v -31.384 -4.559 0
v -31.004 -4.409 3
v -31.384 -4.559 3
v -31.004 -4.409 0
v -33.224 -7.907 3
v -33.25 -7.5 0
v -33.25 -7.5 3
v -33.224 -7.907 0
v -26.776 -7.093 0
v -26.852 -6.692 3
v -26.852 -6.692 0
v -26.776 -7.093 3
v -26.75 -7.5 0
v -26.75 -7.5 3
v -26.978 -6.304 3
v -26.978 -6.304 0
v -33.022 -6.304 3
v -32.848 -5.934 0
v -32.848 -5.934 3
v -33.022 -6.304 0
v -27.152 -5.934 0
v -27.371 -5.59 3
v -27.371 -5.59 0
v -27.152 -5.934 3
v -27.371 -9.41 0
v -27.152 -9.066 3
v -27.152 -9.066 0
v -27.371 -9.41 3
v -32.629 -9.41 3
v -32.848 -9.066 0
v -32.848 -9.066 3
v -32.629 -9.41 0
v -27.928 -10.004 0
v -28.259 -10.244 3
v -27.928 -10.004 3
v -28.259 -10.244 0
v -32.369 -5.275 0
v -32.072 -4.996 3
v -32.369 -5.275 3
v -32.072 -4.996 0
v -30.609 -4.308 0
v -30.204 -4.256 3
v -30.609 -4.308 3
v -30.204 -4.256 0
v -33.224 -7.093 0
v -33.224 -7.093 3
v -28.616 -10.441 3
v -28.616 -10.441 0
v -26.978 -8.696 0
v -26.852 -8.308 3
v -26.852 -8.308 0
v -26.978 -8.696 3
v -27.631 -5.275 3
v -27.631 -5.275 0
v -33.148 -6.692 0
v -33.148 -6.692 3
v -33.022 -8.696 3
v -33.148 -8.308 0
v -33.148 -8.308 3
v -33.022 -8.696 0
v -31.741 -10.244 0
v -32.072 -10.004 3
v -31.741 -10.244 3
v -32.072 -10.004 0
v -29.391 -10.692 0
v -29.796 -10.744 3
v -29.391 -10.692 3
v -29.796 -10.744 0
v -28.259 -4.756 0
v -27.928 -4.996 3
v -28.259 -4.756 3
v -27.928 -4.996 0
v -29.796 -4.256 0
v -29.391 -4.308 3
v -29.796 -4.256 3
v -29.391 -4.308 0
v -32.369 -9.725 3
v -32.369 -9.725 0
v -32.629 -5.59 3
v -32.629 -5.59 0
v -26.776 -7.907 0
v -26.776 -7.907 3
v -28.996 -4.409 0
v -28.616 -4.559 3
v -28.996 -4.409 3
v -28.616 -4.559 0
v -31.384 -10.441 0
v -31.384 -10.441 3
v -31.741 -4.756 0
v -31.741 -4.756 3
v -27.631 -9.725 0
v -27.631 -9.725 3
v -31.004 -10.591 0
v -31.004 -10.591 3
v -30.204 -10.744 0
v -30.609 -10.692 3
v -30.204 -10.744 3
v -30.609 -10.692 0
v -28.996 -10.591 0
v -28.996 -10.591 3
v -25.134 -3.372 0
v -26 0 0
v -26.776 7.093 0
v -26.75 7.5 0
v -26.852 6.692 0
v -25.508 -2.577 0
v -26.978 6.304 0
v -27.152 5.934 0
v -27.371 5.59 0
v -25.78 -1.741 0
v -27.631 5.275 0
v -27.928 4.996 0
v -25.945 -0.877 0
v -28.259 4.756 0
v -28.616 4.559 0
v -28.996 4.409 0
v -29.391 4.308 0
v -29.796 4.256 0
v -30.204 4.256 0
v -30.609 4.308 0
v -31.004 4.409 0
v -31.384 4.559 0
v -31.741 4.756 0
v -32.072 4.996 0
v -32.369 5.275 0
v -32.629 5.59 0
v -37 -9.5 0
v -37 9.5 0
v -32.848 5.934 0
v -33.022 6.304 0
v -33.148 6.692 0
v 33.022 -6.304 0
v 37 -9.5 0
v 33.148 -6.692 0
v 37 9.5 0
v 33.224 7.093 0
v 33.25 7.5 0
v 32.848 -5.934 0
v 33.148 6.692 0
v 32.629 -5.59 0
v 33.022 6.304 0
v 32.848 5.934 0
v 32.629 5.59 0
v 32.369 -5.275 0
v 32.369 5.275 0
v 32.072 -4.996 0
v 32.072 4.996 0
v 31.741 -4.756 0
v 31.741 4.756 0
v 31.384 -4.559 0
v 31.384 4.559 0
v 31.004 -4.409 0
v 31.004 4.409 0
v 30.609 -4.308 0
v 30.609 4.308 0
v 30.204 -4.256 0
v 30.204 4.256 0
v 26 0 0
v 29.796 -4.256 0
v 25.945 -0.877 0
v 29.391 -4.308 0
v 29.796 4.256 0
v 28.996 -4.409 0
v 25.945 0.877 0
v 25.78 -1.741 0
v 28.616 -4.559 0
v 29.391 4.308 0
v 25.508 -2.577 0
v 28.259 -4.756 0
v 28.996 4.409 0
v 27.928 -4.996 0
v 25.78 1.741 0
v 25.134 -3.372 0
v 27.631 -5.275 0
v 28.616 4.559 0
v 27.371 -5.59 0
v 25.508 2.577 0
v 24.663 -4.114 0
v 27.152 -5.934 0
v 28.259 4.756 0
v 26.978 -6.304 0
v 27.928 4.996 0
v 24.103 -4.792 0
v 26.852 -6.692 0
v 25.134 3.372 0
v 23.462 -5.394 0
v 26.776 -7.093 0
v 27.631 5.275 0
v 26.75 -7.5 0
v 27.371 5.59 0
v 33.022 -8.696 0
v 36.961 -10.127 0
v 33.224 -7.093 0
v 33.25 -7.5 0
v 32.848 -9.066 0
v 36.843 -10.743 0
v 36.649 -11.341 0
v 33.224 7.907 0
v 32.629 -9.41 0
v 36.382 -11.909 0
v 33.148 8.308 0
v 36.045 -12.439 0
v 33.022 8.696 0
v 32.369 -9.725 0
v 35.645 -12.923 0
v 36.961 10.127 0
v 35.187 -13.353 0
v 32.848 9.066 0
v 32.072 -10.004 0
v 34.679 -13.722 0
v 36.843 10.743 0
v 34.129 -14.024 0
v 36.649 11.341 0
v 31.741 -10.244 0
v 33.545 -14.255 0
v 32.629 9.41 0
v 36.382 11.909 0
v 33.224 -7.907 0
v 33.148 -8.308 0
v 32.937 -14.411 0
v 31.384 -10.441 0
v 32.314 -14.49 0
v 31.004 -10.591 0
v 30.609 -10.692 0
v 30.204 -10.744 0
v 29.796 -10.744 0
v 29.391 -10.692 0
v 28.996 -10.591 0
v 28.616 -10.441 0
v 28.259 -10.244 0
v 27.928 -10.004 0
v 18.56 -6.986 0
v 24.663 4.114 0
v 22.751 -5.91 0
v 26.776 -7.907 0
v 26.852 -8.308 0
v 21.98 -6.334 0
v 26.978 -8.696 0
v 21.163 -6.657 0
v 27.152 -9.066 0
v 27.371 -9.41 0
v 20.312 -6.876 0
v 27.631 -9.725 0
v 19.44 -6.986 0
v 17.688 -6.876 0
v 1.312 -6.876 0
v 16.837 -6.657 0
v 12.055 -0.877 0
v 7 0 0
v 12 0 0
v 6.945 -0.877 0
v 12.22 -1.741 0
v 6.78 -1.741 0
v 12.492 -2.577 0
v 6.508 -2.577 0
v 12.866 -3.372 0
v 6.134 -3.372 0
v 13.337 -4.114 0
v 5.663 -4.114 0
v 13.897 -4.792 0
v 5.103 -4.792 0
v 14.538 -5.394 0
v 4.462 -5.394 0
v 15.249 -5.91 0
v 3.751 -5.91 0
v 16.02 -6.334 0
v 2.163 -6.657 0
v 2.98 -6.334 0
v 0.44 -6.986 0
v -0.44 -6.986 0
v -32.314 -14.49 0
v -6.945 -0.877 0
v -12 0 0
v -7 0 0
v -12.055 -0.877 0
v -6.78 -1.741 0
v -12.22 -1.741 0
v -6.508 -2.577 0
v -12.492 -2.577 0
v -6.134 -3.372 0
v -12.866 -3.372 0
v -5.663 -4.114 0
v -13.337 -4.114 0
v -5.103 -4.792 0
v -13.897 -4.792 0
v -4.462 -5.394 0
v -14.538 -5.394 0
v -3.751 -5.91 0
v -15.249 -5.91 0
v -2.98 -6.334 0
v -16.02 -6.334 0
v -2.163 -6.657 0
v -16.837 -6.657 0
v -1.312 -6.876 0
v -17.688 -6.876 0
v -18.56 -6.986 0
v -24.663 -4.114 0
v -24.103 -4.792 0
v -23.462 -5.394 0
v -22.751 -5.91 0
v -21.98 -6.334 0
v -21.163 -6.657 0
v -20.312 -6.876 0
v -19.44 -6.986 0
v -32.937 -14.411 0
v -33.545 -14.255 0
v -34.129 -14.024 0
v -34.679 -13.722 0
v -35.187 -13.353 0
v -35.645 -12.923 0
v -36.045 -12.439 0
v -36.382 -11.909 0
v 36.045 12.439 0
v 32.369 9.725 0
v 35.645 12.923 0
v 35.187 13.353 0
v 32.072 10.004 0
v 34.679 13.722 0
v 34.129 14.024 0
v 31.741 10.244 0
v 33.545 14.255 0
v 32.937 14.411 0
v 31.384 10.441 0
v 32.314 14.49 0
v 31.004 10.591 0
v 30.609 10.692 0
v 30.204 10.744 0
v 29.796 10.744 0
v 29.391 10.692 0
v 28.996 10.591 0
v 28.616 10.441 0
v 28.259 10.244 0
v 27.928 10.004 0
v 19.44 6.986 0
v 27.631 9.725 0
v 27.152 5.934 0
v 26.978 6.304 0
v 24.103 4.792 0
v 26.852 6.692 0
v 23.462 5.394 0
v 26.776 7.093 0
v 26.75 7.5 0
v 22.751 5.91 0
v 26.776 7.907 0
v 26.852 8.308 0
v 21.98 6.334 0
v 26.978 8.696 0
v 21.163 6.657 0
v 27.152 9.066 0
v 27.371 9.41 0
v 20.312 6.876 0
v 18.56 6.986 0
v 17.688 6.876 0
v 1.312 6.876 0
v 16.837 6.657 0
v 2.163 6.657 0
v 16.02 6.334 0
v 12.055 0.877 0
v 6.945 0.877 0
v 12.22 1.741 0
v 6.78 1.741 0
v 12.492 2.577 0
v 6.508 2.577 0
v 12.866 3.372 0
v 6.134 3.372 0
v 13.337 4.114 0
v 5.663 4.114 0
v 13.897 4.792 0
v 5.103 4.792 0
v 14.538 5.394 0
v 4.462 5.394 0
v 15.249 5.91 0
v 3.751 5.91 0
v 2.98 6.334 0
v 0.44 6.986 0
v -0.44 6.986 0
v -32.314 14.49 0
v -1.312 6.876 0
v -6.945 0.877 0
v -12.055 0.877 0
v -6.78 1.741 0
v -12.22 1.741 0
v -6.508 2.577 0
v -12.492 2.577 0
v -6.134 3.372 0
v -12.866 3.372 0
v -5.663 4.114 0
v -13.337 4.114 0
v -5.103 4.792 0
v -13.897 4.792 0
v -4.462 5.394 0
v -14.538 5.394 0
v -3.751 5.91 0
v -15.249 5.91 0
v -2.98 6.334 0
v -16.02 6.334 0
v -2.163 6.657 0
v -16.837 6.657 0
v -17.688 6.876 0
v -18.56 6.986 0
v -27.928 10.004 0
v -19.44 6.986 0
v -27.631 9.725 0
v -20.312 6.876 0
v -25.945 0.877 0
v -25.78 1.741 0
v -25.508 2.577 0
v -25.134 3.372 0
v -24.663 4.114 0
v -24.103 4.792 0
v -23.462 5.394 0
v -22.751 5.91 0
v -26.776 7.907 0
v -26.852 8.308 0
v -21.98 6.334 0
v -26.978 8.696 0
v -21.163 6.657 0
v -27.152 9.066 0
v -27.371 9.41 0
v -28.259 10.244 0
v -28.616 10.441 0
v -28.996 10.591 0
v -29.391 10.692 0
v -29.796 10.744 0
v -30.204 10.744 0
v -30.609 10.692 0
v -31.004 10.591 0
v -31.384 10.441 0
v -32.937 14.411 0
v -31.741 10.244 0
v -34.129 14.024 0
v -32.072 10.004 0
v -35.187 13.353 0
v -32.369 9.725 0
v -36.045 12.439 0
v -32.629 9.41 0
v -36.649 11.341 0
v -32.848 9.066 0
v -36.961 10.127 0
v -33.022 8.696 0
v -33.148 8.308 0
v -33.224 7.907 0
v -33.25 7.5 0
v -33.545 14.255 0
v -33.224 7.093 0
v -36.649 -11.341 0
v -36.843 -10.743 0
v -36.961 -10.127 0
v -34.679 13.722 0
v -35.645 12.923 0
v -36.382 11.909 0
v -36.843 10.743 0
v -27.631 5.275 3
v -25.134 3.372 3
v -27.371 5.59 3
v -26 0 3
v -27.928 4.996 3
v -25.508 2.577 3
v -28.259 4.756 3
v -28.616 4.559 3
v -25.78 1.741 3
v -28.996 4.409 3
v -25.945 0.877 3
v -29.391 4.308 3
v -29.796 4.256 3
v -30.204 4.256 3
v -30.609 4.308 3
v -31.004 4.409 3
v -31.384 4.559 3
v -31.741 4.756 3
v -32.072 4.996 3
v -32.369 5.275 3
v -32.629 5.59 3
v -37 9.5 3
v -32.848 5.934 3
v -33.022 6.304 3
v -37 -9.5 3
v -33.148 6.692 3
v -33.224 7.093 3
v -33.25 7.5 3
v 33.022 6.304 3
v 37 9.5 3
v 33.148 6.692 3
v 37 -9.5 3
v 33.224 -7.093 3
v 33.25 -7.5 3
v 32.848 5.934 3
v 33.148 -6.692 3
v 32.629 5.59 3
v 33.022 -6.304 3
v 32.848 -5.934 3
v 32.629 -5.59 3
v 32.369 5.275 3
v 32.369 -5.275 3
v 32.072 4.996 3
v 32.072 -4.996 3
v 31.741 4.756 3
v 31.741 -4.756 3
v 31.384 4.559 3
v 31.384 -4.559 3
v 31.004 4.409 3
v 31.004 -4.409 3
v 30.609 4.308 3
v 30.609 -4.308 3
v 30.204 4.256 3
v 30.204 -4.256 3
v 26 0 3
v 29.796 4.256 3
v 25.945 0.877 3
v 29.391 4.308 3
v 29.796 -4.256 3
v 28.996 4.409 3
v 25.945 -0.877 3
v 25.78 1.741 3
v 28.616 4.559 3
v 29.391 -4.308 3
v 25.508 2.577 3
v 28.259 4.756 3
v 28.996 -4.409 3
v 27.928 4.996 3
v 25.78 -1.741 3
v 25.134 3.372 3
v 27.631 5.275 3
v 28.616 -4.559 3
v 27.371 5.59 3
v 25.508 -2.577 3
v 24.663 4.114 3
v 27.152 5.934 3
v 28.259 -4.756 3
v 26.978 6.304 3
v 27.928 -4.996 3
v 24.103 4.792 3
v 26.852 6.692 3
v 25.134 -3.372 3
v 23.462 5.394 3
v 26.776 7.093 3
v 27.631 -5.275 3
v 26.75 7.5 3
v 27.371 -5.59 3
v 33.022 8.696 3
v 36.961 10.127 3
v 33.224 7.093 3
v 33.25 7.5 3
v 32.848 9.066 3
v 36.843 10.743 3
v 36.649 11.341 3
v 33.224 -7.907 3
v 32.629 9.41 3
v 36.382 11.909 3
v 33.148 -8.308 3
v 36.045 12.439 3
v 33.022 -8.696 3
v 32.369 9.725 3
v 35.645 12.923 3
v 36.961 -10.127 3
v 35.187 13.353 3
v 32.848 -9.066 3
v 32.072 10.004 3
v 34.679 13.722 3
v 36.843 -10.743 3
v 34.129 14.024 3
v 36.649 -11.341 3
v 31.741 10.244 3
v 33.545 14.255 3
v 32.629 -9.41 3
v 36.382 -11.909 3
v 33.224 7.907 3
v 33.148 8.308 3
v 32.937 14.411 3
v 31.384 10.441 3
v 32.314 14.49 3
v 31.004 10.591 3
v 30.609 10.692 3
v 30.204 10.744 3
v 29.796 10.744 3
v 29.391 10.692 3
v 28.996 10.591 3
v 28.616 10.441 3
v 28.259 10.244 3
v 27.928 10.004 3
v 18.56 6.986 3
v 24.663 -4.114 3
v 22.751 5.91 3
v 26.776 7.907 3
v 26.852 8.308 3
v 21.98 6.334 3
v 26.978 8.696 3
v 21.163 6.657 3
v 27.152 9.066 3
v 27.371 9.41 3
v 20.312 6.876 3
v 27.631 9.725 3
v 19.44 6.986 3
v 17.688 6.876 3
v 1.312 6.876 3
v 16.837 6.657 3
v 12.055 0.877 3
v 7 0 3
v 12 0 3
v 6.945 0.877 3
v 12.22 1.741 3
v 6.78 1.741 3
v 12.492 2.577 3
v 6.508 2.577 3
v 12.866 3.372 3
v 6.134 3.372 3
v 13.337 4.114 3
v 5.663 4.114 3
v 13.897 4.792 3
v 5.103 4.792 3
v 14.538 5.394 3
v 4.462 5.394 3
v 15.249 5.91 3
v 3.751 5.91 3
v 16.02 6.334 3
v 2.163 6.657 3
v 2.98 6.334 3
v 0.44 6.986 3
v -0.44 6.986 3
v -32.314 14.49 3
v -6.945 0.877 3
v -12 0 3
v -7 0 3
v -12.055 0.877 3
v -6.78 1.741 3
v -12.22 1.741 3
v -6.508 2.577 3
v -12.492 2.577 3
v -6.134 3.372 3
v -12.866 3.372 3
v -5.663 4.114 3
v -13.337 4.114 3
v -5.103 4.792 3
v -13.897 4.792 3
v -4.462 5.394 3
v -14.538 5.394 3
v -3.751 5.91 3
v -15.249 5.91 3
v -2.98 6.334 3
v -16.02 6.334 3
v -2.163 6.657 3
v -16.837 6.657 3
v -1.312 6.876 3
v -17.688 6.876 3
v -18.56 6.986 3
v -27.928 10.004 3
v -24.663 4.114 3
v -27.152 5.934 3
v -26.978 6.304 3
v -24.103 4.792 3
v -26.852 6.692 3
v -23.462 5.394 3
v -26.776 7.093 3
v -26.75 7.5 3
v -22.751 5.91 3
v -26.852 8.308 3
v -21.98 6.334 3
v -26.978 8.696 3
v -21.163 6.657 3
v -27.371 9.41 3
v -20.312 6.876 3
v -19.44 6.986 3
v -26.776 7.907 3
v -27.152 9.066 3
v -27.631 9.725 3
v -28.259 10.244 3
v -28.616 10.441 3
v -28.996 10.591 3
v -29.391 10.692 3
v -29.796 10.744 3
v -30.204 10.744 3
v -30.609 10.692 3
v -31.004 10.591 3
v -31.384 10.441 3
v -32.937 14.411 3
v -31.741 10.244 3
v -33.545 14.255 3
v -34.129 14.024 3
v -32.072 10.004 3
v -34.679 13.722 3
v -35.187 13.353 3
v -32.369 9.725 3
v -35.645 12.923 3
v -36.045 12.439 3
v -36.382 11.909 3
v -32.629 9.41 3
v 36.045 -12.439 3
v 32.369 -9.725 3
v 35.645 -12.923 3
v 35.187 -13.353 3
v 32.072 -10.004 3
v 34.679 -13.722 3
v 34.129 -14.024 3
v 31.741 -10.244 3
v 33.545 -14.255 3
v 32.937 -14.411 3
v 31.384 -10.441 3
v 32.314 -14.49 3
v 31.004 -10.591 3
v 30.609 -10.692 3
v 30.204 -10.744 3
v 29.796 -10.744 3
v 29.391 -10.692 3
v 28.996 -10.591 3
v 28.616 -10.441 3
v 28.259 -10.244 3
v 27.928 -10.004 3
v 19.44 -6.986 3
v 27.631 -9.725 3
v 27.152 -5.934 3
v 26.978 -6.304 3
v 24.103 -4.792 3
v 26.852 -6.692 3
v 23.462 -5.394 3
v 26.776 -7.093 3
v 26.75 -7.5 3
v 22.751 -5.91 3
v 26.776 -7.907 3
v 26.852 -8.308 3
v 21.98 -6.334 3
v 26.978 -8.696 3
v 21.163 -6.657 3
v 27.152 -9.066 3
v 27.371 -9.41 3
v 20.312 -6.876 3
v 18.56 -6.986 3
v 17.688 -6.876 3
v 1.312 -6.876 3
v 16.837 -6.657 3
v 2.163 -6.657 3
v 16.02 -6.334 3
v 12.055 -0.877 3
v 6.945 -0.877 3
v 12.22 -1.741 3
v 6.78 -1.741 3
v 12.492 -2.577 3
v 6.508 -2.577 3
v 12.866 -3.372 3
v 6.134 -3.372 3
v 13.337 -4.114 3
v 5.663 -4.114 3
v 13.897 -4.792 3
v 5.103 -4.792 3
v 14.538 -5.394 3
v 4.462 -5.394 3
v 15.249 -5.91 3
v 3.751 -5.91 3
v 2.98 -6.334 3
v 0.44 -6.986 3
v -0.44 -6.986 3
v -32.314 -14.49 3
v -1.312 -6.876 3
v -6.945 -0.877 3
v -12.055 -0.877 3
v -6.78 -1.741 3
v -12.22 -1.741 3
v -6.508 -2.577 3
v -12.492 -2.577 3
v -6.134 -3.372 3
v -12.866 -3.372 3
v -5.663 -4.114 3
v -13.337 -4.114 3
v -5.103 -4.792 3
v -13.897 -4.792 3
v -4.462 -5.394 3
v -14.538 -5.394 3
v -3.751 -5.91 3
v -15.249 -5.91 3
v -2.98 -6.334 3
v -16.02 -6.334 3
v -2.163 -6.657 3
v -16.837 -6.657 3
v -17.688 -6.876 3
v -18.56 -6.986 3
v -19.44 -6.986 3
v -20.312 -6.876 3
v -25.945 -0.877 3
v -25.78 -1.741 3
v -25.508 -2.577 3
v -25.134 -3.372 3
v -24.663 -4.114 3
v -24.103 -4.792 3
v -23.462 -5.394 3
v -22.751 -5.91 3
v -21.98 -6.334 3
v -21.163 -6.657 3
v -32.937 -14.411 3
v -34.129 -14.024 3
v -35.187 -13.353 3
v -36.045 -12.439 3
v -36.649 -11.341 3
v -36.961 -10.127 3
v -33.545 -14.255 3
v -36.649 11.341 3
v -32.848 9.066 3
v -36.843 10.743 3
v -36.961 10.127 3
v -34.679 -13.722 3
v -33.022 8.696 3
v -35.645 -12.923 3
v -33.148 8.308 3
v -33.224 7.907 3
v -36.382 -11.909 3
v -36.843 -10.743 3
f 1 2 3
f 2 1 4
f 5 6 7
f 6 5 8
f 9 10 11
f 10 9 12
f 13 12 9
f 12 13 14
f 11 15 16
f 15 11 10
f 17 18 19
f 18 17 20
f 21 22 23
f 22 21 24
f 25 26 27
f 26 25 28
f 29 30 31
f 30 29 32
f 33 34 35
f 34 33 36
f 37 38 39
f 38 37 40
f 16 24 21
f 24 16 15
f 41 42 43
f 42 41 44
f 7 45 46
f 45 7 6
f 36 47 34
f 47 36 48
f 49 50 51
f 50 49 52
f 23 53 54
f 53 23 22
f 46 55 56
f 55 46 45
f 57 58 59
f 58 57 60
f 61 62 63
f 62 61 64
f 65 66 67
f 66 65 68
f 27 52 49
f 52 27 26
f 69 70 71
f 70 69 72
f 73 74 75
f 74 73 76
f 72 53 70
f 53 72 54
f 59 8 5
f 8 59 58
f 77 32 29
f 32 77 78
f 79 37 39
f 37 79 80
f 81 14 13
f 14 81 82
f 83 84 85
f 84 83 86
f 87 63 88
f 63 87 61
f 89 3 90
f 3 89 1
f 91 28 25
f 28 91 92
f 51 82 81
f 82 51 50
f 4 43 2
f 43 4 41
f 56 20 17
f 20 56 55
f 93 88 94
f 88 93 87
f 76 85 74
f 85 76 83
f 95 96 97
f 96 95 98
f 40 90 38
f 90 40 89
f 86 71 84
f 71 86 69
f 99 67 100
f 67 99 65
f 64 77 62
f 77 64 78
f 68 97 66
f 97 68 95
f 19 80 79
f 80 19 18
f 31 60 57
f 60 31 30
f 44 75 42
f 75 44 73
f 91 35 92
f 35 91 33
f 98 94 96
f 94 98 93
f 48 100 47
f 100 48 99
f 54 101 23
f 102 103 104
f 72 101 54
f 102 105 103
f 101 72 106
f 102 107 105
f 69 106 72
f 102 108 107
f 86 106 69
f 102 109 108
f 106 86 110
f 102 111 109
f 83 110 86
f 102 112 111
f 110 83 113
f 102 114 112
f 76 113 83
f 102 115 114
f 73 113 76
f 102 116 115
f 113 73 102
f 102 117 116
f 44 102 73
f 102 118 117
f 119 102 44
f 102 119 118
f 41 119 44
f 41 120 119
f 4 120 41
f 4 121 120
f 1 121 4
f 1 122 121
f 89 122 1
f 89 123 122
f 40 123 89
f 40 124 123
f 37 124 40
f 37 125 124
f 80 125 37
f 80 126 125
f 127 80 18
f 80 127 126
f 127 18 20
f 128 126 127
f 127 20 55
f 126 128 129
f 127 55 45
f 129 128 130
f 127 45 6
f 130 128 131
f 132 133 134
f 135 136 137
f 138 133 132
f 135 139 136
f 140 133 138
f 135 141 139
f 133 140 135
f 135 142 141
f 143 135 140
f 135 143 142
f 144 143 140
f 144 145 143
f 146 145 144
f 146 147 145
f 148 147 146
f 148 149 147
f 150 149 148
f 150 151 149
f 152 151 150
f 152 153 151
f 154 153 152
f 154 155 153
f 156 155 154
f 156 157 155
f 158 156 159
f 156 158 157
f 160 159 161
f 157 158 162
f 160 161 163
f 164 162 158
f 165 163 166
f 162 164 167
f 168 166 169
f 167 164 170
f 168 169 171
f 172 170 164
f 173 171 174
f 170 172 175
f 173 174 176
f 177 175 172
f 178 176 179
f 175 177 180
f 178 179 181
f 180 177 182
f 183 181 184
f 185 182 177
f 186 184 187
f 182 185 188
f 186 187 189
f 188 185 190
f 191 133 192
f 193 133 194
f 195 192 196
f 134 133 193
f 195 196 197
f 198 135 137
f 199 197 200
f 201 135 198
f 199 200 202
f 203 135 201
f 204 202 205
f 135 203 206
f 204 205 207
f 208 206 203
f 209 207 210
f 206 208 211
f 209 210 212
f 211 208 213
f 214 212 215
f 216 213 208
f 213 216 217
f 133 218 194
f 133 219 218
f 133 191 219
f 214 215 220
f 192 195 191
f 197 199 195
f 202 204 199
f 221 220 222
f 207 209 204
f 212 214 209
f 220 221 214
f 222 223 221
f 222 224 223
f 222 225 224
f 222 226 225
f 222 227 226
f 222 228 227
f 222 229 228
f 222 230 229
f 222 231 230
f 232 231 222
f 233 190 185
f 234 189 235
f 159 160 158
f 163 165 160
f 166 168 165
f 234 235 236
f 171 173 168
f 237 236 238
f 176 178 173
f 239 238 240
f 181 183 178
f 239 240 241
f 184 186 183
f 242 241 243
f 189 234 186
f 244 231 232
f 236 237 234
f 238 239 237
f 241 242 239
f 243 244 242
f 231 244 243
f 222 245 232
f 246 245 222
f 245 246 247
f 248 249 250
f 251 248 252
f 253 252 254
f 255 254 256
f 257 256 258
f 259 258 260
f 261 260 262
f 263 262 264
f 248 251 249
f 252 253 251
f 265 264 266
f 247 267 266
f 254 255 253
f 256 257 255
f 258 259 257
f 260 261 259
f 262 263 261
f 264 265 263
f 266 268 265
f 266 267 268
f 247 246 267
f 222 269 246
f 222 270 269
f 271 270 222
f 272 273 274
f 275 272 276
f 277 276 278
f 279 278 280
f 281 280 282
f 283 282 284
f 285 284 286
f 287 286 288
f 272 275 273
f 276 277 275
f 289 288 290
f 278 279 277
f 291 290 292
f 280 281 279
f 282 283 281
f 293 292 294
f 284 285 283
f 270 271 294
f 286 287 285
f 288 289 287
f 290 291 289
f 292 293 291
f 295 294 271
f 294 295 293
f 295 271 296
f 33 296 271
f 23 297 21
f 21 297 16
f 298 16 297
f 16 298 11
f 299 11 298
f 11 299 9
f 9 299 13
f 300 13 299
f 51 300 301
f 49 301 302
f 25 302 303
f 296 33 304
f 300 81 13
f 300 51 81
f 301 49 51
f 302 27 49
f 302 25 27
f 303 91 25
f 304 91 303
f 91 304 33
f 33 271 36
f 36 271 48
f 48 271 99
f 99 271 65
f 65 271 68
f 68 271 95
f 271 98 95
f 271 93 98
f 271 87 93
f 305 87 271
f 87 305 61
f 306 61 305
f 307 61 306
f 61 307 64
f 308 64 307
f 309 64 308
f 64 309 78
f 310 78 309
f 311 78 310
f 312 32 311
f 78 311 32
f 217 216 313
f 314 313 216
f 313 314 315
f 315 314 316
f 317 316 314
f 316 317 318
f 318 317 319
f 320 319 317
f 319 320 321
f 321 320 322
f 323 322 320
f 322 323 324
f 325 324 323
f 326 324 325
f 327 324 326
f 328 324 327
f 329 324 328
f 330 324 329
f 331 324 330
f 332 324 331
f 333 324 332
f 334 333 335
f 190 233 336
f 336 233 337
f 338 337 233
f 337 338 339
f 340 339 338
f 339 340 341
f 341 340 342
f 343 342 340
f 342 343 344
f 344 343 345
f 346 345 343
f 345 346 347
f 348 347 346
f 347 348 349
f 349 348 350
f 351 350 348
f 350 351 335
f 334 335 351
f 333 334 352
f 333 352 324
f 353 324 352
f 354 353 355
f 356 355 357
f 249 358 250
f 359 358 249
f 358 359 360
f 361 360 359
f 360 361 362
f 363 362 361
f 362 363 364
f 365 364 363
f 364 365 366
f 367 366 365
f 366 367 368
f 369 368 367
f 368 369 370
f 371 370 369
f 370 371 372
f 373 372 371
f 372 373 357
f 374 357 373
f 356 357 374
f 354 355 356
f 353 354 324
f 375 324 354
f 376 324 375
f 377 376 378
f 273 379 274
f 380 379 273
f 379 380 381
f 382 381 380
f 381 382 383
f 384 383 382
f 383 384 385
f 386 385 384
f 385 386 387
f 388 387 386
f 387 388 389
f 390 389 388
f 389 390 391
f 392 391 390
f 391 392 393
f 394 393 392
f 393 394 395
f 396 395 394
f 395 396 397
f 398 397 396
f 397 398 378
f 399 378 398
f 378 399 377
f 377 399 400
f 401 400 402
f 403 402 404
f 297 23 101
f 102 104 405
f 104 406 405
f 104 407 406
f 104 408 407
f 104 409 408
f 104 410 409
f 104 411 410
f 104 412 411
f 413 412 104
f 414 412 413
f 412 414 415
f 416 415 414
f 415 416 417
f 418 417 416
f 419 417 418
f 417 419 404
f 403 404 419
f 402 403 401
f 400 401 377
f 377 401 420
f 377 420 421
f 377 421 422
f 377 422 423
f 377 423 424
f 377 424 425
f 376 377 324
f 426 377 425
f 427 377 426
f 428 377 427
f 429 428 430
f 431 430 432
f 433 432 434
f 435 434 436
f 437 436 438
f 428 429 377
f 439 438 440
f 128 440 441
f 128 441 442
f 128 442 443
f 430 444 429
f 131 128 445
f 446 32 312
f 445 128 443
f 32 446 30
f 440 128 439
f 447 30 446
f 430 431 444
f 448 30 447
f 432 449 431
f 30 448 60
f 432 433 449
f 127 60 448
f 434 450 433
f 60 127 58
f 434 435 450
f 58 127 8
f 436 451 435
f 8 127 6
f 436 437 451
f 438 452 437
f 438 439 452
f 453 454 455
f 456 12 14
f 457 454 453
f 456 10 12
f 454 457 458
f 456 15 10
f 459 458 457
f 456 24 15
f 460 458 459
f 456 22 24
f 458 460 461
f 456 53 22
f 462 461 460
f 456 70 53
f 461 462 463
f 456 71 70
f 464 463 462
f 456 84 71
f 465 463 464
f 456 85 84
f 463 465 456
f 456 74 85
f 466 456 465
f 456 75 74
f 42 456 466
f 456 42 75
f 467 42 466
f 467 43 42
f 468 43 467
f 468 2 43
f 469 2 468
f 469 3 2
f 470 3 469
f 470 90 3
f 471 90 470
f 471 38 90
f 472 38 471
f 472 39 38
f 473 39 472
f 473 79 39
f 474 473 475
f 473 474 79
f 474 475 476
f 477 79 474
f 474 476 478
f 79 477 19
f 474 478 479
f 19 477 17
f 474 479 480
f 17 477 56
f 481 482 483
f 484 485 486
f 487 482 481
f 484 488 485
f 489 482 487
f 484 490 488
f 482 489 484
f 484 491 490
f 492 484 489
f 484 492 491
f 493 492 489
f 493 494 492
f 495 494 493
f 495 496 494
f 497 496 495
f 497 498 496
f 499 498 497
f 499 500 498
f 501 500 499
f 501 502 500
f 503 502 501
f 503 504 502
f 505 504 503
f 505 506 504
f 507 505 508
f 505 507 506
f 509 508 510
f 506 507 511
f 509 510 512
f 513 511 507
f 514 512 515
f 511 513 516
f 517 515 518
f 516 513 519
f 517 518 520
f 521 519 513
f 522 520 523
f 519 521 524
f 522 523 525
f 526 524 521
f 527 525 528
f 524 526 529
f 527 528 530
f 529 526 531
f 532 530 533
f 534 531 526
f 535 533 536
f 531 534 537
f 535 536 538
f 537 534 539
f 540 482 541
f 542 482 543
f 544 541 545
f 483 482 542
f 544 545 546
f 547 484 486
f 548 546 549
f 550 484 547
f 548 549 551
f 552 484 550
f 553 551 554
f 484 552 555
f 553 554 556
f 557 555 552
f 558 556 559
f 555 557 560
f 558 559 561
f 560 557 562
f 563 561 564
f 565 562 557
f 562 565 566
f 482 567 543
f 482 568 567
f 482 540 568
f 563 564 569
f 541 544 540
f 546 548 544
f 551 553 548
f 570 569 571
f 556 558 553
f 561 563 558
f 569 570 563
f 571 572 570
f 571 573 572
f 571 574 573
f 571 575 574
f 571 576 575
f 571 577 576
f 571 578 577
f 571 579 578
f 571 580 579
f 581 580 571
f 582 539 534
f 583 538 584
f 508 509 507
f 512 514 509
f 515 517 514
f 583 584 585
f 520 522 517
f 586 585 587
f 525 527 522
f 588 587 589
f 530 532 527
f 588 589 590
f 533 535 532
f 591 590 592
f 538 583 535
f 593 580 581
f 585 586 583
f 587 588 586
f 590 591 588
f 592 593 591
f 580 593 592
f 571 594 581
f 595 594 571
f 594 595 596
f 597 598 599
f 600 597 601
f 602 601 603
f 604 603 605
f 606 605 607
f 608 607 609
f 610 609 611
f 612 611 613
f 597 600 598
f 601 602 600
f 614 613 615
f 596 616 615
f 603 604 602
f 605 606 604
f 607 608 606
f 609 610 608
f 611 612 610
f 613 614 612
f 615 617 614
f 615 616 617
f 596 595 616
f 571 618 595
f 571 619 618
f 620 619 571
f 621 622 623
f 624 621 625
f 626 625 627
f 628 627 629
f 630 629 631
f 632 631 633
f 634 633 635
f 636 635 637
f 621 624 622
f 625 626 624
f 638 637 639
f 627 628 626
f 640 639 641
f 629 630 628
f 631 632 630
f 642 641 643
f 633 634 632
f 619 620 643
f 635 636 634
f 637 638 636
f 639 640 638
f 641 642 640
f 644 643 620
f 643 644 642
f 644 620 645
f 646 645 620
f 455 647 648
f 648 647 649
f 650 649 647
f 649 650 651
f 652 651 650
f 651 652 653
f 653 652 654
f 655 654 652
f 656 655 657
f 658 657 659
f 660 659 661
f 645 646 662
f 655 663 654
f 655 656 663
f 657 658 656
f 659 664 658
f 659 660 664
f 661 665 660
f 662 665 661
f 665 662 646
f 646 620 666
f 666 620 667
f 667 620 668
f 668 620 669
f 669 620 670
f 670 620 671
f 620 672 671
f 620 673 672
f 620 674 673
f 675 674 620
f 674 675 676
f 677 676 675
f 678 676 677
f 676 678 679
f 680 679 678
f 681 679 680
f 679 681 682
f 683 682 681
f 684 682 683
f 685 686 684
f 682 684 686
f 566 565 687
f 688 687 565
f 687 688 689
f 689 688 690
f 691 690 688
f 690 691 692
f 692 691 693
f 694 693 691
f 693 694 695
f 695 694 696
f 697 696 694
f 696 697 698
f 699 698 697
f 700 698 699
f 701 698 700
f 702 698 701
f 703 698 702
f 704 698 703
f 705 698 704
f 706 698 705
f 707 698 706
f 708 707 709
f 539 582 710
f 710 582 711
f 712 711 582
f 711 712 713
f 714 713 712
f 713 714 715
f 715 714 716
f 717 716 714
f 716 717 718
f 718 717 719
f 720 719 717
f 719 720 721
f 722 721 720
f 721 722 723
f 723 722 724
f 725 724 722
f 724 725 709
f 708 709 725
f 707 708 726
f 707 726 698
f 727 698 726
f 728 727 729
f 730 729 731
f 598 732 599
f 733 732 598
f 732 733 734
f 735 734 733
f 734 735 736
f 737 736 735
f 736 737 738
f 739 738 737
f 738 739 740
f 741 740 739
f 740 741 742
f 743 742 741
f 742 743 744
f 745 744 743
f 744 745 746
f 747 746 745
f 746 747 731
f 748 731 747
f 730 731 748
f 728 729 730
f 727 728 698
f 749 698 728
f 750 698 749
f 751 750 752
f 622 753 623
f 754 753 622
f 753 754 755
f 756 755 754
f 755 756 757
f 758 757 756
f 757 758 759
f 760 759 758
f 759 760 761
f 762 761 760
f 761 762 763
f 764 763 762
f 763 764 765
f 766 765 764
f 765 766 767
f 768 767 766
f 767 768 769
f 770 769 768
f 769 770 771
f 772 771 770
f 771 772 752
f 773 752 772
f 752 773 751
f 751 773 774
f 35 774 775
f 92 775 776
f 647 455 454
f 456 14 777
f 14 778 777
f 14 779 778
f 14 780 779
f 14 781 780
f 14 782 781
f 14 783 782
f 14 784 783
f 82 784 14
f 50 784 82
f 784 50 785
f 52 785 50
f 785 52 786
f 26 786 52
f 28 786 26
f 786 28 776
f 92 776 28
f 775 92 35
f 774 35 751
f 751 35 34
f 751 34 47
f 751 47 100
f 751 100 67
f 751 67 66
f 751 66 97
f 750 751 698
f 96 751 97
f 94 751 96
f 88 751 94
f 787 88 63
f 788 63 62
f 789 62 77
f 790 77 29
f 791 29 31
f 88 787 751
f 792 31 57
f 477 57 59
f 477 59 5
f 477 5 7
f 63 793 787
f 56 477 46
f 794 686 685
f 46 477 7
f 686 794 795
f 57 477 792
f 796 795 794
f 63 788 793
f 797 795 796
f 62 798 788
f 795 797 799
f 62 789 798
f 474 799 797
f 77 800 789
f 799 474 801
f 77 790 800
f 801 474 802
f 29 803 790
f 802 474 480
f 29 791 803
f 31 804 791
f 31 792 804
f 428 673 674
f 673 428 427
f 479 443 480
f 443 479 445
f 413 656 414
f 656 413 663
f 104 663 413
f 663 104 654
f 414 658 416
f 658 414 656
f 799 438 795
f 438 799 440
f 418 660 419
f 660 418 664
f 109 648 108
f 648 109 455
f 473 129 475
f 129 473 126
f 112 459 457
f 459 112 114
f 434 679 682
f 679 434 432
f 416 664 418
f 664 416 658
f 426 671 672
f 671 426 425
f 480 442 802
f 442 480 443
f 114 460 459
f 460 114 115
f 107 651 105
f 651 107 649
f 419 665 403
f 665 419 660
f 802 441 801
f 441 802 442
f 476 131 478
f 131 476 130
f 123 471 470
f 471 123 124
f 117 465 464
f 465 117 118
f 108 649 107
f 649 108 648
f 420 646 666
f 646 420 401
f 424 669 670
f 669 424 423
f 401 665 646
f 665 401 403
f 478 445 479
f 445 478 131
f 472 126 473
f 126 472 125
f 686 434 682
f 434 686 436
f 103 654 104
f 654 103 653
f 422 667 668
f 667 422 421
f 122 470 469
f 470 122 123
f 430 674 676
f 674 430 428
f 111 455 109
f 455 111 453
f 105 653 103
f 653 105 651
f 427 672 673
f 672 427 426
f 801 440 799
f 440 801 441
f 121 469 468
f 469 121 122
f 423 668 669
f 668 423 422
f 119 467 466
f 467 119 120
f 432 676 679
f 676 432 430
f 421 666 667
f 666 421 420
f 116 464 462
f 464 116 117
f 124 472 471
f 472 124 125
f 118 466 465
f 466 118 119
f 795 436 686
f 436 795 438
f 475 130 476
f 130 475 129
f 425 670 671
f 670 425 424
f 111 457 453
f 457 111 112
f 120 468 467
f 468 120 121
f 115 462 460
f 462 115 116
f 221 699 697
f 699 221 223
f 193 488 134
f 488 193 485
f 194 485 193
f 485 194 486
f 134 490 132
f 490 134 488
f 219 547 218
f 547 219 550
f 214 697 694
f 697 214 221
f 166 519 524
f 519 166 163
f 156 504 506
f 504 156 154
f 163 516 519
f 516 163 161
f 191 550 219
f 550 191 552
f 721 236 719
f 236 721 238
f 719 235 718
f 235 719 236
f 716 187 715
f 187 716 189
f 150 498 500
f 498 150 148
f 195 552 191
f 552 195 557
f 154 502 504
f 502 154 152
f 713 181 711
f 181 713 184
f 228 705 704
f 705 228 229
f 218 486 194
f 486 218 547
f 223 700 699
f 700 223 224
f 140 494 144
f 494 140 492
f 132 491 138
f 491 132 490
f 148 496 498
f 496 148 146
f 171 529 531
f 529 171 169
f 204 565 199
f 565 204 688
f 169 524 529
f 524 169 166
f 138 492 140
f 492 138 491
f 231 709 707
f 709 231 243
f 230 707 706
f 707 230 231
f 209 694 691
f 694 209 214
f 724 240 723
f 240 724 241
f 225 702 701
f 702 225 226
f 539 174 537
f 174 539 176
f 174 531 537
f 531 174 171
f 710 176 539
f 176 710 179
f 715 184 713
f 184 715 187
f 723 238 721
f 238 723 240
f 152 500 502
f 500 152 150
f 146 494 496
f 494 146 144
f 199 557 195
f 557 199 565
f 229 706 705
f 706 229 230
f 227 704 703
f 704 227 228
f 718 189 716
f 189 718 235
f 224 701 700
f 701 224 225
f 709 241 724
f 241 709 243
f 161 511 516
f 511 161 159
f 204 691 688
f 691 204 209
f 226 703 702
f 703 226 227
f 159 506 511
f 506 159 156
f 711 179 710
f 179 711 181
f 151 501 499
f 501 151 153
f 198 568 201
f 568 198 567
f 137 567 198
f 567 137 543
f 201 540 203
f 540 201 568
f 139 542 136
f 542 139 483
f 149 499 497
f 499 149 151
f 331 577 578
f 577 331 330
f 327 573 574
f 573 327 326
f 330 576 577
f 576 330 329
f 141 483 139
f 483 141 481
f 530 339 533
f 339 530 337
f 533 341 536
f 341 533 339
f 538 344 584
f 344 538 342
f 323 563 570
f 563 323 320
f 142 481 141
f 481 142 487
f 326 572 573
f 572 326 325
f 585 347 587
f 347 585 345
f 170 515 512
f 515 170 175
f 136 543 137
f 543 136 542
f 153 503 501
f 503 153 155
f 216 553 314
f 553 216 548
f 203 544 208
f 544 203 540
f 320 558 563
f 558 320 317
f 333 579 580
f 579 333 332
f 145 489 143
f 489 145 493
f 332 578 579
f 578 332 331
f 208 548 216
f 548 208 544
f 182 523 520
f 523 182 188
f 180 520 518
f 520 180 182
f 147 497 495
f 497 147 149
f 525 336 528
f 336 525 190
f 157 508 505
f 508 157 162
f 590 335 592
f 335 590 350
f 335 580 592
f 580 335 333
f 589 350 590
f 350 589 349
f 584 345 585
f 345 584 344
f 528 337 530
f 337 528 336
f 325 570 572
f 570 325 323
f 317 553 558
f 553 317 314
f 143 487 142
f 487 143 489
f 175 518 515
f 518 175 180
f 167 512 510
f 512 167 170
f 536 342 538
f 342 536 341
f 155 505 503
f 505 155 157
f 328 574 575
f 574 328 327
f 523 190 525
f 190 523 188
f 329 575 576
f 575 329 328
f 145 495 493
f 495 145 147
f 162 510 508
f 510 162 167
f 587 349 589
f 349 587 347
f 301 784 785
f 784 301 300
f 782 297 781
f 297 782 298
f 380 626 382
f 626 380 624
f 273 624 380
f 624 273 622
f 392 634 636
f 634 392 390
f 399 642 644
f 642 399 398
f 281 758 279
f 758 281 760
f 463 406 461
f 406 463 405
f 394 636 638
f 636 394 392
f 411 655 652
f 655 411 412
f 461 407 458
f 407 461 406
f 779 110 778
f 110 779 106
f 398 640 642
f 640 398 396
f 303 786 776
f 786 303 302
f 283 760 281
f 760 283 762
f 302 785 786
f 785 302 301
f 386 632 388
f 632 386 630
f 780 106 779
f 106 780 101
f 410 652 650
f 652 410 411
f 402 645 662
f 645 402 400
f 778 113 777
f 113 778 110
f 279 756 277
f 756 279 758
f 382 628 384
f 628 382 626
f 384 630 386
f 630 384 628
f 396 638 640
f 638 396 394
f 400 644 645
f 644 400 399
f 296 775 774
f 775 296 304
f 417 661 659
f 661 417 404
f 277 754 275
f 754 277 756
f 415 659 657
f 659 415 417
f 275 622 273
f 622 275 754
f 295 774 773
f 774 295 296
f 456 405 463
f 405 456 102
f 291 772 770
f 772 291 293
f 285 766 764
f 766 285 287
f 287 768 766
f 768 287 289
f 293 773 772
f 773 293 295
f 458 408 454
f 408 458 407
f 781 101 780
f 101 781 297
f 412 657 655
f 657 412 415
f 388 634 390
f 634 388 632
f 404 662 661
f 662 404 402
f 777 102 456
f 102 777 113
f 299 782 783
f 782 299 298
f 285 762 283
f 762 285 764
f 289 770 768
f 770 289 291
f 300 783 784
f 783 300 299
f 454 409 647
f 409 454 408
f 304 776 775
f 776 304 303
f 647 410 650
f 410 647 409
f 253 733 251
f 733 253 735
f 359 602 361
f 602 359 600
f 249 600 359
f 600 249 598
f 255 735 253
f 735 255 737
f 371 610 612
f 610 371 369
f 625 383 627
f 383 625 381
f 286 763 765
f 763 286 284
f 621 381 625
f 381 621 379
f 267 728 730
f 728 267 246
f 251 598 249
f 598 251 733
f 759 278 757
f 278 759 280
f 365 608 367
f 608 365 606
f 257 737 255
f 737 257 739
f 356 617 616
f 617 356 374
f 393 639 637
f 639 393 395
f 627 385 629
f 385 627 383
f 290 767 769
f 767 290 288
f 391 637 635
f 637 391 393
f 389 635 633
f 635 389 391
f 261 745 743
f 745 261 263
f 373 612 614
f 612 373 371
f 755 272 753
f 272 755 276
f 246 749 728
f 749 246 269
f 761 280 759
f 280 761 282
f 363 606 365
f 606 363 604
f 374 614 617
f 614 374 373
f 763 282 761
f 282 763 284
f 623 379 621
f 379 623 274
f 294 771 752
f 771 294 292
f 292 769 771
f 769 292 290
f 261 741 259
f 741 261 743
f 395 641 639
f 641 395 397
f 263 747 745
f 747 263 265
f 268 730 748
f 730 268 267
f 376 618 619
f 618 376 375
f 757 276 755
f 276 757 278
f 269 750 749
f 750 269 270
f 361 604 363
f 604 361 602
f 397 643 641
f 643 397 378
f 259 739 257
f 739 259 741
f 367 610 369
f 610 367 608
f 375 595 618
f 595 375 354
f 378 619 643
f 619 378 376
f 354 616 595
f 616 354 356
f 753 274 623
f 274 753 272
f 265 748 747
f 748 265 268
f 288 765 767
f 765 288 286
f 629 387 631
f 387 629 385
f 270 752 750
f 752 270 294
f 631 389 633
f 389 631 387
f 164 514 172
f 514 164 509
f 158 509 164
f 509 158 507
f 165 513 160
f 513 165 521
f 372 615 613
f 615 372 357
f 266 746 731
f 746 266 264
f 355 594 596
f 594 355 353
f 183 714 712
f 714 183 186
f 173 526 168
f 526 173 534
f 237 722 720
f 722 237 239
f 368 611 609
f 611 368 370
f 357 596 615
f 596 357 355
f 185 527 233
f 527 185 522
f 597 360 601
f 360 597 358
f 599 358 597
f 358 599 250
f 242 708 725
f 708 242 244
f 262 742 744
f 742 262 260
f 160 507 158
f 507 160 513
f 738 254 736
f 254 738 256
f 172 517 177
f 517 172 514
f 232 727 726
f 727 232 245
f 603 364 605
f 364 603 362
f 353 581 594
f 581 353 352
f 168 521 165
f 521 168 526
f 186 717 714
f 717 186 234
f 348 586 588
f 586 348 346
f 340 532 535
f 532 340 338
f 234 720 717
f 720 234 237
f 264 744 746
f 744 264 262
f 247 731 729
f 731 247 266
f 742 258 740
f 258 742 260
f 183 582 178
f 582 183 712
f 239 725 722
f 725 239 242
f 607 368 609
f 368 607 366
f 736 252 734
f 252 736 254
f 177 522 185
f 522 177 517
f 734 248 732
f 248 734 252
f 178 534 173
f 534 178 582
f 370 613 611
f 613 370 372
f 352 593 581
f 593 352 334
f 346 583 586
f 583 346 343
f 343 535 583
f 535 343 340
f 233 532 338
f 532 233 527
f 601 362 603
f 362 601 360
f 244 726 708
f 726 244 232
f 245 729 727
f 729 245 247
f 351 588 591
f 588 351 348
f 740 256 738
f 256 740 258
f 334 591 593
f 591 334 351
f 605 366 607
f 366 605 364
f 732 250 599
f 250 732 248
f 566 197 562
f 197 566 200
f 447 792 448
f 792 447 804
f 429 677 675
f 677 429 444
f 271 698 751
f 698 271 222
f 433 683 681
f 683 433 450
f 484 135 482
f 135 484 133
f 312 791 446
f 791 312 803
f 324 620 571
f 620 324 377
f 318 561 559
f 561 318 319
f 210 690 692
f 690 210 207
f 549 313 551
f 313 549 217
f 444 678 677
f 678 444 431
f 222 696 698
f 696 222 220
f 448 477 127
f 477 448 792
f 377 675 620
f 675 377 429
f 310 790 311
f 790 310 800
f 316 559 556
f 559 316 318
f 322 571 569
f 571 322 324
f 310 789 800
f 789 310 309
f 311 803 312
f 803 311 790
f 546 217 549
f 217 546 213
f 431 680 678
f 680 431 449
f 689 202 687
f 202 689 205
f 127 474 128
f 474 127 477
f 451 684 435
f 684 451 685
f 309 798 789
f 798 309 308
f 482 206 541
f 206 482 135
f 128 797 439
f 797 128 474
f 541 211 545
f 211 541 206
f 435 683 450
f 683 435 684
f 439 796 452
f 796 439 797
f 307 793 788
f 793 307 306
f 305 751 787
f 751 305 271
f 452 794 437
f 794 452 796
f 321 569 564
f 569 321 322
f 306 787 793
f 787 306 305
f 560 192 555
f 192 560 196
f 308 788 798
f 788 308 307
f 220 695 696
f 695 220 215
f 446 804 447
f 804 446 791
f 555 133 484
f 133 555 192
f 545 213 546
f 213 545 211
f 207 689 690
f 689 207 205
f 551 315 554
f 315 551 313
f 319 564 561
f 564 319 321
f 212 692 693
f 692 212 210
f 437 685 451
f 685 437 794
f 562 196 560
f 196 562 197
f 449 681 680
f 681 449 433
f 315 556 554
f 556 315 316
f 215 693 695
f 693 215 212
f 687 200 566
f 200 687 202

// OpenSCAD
$fn = 50;

difference() {
	union() {
		hull() {
			translate(v = [-32.0, 9.5, 0]) {
				cylinder(h = 3, r = 5);
			}
			translate(v = [32.0, 9.5, 0]) {
				cylinder(h = 3, r = 5);
			}
			translate(v = [-32.0, -9.5, 0]) {
				cylinder(h = 3, r = 5);
			}
			translate(v = [32.0, -9.5, 0]) {
				cylinder(h = 3, r = 5);
			}
		}
	}
	union() {
		translate(v = [-30.0, -7.5, 0]) {
			cylinder(h = 3, r = 3.25);
		}
		translate(v = [-30.0, 7.5, 0]) {
			cylinder(h = 3, r = 3.25);
		}
		translate(v = [30.0, -7.5, 0]) {
			cylinder(h = 3, r = 3.25);
		}
		translate(v = [30.0, 7.5, 0]) {
			cylinder(h = 3, r = 3.25);
		}
		translate(v = [-19.0, 0, 0.0]) {
			cylinder(h = 3, r = 7.0);
		}
		cylinder(h = 3, r = 7.0);
		translate(v = [19.0, 0, 0.0]) {
			cylinder(h = 3, r = 7.0);
		}
	}
}
